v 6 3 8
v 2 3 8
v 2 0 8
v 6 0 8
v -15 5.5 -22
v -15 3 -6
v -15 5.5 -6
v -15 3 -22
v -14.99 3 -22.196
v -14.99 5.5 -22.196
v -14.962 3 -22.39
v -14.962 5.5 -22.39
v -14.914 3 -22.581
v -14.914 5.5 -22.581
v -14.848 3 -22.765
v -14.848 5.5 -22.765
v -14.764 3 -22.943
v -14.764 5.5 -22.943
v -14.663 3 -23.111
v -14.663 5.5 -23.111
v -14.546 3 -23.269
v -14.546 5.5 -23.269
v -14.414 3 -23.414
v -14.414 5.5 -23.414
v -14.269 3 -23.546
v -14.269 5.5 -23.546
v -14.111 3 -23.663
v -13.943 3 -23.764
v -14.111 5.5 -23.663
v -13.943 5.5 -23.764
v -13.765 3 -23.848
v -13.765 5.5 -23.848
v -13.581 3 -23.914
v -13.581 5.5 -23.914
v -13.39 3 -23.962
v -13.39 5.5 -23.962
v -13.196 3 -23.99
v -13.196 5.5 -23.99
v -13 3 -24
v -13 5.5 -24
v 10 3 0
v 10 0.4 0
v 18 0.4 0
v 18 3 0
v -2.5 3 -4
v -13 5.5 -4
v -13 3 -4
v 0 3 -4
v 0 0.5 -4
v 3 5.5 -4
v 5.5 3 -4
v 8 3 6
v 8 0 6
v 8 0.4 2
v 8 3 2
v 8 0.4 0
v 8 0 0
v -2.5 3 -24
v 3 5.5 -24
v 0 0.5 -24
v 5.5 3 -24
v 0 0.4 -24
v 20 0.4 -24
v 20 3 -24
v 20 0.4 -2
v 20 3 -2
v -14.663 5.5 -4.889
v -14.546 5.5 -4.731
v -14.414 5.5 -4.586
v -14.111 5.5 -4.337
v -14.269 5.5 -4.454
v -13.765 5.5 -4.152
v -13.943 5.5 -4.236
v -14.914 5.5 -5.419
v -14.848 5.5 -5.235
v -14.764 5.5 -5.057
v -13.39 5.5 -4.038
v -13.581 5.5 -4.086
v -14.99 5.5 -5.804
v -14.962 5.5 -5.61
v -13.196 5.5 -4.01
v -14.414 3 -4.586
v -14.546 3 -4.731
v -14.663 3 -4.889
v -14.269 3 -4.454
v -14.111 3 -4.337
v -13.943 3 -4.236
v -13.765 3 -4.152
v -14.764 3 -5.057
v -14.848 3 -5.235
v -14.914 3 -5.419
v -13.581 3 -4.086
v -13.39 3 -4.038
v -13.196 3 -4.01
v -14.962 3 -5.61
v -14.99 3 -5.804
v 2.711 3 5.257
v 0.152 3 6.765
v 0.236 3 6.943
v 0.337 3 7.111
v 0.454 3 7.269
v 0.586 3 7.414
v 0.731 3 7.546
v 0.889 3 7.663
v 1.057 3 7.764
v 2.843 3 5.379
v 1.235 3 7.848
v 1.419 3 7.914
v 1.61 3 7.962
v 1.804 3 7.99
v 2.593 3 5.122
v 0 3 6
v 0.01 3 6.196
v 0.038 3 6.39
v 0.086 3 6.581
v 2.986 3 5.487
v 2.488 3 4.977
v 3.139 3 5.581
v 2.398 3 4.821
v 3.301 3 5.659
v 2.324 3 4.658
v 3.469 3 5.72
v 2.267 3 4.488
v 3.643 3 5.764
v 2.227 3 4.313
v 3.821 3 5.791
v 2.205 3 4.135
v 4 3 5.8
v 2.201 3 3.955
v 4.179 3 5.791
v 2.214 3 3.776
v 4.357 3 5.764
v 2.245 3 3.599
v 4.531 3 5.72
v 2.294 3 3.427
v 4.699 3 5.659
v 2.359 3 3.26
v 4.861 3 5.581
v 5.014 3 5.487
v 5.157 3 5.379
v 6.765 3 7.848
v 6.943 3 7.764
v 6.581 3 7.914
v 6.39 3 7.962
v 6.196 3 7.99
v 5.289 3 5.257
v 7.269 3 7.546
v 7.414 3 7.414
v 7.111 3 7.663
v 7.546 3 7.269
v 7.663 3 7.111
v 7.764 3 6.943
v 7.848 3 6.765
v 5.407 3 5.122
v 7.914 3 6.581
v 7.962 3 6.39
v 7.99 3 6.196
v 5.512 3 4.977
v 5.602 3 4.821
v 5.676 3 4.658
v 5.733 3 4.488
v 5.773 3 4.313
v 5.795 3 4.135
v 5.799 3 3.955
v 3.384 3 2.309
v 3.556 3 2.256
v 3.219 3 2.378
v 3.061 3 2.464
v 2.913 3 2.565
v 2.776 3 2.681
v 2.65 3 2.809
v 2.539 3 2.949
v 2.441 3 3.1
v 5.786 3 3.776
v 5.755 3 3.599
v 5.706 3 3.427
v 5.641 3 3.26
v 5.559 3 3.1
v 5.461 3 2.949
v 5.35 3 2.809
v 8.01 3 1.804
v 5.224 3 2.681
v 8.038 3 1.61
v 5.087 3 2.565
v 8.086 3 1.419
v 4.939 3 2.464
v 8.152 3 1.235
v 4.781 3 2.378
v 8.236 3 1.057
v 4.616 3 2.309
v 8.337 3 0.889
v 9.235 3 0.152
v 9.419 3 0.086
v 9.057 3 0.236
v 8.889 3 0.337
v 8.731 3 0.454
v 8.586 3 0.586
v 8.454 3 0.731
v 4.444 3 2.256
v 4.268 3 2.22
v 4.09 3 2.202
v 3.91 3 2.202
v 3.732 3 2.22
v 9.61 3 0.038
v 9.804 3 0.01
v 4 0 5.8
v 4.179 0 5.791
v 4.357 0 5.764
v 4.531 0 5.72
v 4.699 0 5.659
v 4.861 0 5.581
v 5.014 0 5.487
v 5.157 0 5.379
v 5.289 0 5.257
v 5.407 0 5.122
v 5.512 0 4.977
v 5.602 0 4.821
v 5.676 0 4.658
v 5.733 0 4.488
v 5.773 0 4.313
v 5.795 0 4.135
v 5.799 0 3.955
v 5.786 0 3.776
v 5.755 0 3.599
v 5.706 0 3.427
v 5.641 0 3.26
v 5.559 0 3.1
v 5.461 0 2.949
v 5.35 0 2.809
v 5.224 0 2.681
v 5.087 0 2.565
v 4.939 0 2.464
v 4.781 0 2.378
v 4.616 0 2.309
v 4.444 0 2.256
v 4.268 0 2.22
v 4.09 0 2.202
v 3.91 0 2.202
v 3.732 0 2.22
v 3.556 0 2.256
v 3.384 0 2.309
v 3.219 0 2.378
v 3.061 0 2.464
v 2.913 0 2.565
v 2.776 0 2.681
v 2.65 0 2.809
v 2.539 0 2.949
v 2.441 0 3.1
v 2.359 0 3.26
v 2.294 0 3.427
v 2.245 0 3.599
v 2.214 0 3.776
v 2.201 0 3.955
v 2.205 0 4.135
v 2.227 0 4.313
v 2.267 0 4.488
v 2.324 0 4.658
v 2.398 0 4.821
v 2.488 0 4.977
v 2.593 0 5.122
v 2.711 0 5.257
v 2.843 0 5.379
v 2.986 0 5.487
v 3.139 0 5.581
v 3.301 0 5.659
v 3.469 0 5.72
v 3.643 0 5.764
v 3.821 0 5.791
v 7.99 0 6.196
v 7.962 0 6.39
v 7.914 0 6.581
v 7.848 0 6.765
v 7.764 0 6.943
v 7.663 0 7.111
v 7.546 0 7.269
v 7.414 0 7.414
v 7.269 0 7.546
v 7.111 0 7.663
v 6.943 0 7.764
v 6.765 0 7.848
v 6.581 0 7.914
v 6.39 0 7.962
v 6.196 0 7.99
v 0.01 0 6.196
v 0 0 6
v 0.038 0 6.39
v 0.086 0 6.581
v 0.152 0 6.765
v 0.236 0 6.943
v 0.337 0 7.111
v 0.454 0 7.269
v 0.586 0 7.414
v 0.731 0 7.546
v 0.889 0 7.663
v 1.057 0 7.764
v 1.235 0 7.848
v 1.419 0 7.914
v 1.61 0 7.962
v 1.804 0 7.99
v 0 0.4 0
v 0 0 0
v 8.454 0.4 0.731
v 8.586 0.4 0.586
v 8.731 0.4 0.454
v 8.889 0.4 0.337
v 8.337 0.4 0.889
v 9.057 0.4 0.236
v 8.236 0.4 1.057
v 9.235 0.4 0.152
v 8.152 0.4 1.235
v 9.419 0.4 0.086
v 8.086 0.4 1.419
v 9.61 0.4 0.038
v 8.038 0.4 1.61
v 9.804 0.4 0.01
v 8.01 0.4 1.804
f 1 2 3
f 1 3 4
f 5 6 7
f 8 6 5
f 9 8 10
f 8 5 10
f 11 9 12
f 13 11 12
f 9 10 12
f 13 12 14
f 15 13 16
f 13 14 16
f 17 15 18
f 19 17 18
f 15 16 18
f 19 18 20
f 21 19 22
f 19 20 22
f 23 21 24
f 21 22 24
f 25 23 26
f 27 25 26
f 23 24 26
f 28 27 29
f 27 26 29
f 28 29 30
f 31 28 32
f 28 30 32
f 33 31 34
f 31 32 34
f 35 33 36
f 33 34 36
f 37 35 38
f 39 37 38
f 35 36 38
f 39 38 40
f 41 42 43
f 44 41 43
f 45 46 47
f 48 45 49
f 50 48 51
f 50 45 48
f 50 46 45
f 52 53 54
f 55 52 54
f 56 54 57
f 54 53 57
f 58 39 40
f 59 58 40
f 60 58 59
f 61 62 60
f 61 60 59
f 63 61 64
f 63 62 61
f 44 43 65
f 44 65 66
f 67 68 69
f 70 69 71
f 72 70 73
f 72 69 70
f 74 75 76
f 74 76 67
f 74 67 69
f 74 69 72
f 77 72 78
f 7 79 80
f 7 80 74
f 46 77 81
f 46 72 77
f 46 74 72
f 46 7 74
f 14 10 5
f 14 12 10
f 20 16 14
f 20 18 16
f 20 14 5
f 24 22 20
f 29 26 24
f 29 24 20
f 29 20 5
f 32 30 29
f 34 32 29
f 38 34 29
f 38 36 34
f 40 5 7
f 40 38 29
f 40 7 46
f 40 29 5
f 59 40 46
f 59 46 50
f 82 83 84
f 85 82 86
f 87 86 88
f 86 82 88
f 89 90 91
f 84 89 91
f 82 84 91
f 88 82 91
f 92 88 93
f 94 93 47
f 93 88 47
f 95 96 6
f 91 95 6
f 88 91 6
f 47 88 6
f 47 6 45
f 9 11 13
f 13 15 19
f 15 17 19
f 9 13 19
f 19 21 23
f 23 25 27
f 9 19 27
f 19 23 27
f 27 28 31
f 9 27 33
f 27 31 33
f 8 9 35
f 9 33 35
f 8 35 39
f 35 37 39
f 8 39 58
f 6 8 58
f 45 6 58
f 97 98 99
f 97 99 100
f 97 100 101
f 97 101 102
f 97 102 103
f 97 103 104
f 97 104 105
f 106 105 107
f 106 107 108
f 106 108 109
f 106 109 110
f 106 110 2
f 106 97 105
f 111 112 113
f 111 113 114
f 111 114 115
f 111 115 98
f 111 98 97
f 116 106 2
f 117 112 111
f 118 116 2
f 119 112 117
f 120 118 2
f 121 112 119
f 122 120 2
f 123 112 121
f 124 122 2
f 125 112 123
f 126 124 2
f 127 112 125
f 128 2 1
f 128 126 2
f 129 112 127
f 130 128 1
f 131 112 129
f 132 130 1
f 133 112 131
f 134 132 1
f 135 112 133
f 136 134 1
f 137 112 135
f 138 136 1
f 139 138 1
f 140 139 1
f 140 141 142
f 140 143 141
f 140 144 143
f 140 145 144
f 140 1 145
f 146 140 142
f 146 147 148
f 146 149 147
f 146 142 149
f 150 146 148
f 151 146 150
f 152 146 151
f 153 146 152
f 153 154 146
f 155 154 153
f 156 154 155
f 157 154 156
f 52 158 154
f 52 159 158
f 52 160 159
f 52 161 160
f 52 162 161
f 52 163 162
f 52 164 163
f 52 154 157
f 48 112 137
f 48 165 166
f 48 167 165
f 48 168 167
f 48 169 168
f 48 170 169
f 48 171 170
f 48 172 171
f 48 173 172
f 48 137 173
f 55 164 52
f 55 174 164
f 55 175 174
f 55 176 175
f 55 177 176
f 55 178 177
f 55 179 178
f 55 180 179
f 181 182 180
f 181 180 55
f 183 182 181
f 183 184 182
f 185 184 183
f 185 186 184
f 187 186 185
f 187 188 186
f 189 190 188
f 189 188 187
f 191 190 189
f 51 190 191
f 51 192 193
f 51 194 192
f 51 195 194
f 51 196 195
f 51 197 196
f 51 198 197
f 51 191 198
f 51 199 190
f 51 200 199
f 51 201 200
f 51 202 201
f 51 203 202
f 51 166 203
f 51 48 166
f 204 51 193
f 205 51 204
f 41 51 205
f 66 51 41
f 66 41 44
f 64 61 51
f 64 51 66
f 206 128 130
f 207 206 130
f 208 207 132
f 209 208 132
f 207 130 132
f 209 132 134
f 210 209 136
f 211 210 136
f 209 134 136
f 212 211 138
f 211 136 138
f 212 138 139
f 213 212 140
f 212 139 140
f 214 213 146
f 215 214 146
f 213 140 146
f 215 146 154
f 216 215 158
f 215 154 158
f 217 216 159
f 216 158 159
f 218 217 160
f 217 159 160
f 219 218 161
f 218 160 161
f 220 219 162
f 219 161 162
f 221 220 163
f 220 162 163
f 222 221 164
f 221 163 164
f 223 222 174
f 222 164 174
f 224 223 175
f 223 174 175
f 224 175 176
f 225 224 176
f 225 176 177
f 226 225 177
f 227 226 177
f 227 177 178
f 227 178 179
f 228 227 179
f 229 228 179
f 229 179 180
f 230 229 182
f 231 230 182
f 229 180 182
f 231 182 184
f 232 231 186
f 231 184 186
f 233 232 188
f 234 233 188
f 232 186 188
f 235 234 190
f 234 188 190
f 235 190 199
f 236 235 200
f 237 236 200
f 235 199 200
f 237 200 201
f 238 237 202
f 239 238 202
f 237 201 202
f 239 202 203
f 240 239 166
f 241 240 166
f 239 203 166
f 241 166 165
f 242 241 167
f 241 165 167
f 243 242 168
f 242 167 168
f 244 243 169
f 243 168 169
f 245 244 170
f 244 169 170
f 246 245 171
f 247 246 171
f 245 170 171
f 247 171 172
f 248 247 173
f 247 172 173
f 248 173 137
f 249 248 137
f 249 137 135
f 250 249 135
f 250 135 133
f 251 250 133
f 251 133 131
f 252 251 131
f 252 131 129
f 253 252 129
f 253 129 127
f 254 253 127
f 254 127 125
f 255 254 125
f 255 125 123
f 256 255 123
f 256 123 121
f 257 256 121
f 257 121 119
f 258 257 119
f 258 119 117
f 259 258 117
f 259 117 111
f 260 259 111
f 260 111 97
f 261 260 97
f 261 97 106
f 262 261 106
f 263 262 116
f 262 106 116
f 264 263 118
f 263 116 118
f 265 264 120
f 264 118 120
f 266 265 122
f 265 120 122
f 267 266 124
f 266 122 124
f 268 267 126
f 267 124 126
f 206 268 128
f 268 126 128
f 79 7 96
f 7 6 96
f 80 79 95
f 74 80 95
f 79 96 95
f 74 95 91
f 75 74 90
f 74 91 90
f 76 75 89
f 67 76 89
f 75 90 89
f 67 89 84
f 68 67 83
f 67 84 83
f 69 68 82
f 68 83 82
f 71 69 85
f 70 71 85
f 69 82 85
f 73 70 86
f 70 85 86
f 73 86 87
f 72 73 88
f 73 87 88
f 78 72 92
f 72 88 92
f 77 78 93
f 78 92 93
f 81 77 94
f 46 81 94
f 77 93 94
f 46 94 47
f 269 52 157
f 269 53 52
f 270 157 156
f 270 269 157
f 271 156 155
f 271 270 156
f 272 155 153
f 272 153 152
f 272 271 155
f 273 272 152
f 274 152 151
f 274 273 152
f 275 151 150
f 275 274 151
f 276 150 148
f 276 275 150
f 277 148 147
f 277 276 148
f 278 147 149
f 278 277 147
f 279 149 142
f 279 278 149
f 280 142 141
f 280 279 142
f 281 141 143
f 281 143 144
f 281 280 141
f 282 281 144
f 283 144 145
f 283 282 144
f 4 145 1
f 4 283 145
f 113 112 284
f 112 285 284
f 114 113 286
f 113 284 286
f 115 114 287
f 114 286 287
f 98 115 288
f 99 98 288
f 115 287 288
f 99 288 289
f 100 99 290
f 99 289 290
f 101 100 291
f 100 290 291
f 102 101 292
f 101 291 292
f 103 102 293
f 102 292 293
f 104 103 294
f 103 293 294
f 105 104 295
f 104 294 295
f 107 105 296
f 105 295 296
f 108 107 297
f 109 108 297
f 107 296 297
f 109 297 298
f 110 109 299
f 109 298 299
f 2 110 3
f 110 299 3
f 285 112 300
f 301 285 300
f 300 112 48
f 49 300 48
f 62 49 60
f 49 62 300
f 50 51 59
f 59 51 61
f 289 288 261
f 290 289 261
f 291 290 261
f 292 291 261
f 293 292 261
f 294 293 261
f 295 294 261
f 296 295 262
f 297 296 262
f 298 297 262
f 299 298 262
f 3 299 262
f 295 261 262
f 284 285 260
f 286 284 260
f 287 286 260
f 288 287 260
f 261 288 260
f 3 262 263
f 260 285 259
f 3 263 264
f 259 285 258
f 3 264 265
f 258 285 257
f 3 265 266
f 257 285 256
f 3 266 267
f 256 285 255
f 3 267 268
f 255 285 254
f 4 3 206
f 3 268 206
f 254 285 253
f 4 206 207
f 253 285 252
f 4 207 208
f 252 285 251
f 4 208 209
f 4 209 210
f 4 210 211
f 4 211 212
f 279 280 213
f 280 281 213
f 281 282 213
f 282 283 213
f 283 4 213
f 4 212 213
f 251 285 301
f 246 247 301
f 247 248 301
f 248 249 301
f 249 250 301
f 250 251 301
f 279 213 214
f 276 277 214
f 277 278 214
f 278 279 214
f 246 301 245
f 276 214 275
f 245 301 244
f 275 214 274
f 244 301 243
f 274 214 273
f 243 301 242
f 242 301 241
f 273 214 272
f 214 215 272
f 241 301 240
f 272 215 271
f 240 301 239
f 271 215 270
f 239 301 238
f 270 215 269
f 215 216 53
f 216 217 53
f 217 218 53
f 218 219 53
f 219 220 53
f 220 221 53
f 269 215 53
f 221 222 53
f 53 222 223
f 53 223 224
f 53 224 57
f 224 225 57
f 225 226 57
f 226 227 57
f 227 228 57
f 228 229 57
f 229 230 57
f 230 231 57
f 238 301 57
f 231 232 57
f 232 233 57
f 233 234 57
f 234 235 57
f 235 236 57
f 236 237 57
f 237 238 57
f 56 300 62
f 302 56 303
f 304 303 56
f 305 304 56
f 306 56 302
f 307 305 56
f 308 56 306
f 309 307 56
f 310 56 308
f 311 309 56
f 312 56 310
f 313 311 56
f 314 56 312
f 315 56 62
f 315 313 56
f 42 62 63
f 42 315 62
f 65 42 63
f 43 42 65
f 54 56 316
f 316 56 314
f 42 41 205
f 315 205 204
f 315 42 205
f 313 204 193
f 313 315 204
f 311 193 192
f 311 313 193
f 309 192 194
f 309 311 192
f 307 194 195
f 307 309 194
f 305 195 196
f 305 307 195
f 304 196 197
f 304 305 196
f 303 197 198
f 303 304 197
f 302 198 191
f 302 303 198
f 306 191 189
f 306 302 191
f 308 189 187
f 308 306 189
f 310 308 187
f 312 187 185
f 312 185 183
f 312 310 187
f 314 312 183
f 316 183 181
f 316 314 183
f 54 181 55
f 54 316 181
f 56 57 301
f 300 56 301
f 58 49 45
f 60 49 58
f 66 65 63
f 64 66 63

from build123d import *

# Parameters (mm, degrees)
SKETCH1_W           = 20
SKETCH1_H           = 24
BOSS_EXTRUDE1_DEPTH = 3
SKETCH2_W           = 8
SKETCH2_H           = 8
SKETCH2_R           = 1.8
BOSS_EXTRUDE2_DEPTH = 3
FILLET1_R           = 2
CHAMFER1_SIZE       = 2
SKETCH3_W           = 18
SKETCH3_H           = 24
BOSS_EXTRUDE3_DEPTH = 2.5
CHAMFER2_SIZE       = 2.5
CUT_EXTRUDE4_DEPTH  = 4
FILLET2_R           = 2
CUT_EXTRUDE3_DEPTH  = 0.4


with BuildPart() as part:
    # Sketch1 → Boss-Extrude1 (new body)
    with BuildSketch(Plane(origin=(0, 0, 0), x_dir=(1, 0, 0), z_dir=(0, 1, 0))):
        with Locations((10, 12)):
            Rectangle(SKETCH1_W, SKETCH1_H)
    extrude(amount=BOSS_EXTRUDE1_DEPTH)

    # Sketch2 → Boss-Extrude2 (add)
    with BuildSketch(Plane(origin=(0, 3, 0), x_dir=(1, 0, 0), z_dir=(0, 1, 0))):
        with Locations((4, -4)):
            Rectangle(SKETCH2_W, SKETCH2_H)
        with Locations(Location((4, -4, 0), (0, 0, 270))):
            Circle(SKETCH2_R, mode=Mode.SUBTRACT)
    extrude(amount=-BOSS_EXTRUDE2_DEPTH)

    # Fillet1
    fillet1_edges = [part.edges().sort_by_distance(p)[0] for p in [
        (8, 1.5, 0),
        (8, 1.5, 8),
        (0, 1.5, 8),
    ]]
    fillet(fillet1_edges, radius=FILLET1_R)

    # Chamfer1
    chamfer1_edges = [part.edges().sort_by_distance(p)[0] for p in [
        (20, 1.5, 0),
    ]]
    chamfer(chamfer1_edges, length=CHAMFER1_SIZE)

    # Sketch3 → Boss-Extrude3 (add)
    with BuildSketch(Plane(origin=(0, 3, 0), x_dir=(1, 0, 0), z_dir=(0, 1, 0))):
        with Locations((-6, 12)):
            Rectangle(SKETCH3_W, SKETCH3_H)
    extrude(amount=BOSS_EXTRUDE3_DEPTH)

    # Chamfer2
    chamfer2_edges = [part.edges().sort_by_distance(p)[0] for p in [
        (0, 3, -12),
        (3, 3, -12),
    ]]
    chamfer(chamfer2_edges, length=CHAMFER2_SIZE - 0.0001)  # a hair under: the kernel refuses the full size

    # Sketch5 → Cut-Extrude4 (cut)
    with BuildSketch(Plane.XY):
        Polygon((-15, 3), (-2.5, 3), (0, 0.5), (0, 3), (5.5, 3), (3, 5.5), (-15, 5.5), align=None)
    extrude(amount=-CUT_EXTRUDE4_DEPTH, mode=Mode.SUBTRACT)

    # Fillet2
    fillet2_edges = [part.edges().sort_by_distance(p)[0] for p in [
        (-15, 4.25, -24),
        (-15, 4.25, -4),
    ]]
    fillet(fillet2_edges, radius=FILLET2_R)

    # Sketch4 → Cut-Extrude3 (cut)
    with BuildSketch(Plane.XZ):
        Polygon((8, 2), (8, 0), (0, 0), (0, -24), (20, -24), (20, 0), (20, 2), align=None)
    extrude(amount=-CUT_EXTRUDE3_DEPTH, mode=Mode.SUBTRACT)


solid = part.part
